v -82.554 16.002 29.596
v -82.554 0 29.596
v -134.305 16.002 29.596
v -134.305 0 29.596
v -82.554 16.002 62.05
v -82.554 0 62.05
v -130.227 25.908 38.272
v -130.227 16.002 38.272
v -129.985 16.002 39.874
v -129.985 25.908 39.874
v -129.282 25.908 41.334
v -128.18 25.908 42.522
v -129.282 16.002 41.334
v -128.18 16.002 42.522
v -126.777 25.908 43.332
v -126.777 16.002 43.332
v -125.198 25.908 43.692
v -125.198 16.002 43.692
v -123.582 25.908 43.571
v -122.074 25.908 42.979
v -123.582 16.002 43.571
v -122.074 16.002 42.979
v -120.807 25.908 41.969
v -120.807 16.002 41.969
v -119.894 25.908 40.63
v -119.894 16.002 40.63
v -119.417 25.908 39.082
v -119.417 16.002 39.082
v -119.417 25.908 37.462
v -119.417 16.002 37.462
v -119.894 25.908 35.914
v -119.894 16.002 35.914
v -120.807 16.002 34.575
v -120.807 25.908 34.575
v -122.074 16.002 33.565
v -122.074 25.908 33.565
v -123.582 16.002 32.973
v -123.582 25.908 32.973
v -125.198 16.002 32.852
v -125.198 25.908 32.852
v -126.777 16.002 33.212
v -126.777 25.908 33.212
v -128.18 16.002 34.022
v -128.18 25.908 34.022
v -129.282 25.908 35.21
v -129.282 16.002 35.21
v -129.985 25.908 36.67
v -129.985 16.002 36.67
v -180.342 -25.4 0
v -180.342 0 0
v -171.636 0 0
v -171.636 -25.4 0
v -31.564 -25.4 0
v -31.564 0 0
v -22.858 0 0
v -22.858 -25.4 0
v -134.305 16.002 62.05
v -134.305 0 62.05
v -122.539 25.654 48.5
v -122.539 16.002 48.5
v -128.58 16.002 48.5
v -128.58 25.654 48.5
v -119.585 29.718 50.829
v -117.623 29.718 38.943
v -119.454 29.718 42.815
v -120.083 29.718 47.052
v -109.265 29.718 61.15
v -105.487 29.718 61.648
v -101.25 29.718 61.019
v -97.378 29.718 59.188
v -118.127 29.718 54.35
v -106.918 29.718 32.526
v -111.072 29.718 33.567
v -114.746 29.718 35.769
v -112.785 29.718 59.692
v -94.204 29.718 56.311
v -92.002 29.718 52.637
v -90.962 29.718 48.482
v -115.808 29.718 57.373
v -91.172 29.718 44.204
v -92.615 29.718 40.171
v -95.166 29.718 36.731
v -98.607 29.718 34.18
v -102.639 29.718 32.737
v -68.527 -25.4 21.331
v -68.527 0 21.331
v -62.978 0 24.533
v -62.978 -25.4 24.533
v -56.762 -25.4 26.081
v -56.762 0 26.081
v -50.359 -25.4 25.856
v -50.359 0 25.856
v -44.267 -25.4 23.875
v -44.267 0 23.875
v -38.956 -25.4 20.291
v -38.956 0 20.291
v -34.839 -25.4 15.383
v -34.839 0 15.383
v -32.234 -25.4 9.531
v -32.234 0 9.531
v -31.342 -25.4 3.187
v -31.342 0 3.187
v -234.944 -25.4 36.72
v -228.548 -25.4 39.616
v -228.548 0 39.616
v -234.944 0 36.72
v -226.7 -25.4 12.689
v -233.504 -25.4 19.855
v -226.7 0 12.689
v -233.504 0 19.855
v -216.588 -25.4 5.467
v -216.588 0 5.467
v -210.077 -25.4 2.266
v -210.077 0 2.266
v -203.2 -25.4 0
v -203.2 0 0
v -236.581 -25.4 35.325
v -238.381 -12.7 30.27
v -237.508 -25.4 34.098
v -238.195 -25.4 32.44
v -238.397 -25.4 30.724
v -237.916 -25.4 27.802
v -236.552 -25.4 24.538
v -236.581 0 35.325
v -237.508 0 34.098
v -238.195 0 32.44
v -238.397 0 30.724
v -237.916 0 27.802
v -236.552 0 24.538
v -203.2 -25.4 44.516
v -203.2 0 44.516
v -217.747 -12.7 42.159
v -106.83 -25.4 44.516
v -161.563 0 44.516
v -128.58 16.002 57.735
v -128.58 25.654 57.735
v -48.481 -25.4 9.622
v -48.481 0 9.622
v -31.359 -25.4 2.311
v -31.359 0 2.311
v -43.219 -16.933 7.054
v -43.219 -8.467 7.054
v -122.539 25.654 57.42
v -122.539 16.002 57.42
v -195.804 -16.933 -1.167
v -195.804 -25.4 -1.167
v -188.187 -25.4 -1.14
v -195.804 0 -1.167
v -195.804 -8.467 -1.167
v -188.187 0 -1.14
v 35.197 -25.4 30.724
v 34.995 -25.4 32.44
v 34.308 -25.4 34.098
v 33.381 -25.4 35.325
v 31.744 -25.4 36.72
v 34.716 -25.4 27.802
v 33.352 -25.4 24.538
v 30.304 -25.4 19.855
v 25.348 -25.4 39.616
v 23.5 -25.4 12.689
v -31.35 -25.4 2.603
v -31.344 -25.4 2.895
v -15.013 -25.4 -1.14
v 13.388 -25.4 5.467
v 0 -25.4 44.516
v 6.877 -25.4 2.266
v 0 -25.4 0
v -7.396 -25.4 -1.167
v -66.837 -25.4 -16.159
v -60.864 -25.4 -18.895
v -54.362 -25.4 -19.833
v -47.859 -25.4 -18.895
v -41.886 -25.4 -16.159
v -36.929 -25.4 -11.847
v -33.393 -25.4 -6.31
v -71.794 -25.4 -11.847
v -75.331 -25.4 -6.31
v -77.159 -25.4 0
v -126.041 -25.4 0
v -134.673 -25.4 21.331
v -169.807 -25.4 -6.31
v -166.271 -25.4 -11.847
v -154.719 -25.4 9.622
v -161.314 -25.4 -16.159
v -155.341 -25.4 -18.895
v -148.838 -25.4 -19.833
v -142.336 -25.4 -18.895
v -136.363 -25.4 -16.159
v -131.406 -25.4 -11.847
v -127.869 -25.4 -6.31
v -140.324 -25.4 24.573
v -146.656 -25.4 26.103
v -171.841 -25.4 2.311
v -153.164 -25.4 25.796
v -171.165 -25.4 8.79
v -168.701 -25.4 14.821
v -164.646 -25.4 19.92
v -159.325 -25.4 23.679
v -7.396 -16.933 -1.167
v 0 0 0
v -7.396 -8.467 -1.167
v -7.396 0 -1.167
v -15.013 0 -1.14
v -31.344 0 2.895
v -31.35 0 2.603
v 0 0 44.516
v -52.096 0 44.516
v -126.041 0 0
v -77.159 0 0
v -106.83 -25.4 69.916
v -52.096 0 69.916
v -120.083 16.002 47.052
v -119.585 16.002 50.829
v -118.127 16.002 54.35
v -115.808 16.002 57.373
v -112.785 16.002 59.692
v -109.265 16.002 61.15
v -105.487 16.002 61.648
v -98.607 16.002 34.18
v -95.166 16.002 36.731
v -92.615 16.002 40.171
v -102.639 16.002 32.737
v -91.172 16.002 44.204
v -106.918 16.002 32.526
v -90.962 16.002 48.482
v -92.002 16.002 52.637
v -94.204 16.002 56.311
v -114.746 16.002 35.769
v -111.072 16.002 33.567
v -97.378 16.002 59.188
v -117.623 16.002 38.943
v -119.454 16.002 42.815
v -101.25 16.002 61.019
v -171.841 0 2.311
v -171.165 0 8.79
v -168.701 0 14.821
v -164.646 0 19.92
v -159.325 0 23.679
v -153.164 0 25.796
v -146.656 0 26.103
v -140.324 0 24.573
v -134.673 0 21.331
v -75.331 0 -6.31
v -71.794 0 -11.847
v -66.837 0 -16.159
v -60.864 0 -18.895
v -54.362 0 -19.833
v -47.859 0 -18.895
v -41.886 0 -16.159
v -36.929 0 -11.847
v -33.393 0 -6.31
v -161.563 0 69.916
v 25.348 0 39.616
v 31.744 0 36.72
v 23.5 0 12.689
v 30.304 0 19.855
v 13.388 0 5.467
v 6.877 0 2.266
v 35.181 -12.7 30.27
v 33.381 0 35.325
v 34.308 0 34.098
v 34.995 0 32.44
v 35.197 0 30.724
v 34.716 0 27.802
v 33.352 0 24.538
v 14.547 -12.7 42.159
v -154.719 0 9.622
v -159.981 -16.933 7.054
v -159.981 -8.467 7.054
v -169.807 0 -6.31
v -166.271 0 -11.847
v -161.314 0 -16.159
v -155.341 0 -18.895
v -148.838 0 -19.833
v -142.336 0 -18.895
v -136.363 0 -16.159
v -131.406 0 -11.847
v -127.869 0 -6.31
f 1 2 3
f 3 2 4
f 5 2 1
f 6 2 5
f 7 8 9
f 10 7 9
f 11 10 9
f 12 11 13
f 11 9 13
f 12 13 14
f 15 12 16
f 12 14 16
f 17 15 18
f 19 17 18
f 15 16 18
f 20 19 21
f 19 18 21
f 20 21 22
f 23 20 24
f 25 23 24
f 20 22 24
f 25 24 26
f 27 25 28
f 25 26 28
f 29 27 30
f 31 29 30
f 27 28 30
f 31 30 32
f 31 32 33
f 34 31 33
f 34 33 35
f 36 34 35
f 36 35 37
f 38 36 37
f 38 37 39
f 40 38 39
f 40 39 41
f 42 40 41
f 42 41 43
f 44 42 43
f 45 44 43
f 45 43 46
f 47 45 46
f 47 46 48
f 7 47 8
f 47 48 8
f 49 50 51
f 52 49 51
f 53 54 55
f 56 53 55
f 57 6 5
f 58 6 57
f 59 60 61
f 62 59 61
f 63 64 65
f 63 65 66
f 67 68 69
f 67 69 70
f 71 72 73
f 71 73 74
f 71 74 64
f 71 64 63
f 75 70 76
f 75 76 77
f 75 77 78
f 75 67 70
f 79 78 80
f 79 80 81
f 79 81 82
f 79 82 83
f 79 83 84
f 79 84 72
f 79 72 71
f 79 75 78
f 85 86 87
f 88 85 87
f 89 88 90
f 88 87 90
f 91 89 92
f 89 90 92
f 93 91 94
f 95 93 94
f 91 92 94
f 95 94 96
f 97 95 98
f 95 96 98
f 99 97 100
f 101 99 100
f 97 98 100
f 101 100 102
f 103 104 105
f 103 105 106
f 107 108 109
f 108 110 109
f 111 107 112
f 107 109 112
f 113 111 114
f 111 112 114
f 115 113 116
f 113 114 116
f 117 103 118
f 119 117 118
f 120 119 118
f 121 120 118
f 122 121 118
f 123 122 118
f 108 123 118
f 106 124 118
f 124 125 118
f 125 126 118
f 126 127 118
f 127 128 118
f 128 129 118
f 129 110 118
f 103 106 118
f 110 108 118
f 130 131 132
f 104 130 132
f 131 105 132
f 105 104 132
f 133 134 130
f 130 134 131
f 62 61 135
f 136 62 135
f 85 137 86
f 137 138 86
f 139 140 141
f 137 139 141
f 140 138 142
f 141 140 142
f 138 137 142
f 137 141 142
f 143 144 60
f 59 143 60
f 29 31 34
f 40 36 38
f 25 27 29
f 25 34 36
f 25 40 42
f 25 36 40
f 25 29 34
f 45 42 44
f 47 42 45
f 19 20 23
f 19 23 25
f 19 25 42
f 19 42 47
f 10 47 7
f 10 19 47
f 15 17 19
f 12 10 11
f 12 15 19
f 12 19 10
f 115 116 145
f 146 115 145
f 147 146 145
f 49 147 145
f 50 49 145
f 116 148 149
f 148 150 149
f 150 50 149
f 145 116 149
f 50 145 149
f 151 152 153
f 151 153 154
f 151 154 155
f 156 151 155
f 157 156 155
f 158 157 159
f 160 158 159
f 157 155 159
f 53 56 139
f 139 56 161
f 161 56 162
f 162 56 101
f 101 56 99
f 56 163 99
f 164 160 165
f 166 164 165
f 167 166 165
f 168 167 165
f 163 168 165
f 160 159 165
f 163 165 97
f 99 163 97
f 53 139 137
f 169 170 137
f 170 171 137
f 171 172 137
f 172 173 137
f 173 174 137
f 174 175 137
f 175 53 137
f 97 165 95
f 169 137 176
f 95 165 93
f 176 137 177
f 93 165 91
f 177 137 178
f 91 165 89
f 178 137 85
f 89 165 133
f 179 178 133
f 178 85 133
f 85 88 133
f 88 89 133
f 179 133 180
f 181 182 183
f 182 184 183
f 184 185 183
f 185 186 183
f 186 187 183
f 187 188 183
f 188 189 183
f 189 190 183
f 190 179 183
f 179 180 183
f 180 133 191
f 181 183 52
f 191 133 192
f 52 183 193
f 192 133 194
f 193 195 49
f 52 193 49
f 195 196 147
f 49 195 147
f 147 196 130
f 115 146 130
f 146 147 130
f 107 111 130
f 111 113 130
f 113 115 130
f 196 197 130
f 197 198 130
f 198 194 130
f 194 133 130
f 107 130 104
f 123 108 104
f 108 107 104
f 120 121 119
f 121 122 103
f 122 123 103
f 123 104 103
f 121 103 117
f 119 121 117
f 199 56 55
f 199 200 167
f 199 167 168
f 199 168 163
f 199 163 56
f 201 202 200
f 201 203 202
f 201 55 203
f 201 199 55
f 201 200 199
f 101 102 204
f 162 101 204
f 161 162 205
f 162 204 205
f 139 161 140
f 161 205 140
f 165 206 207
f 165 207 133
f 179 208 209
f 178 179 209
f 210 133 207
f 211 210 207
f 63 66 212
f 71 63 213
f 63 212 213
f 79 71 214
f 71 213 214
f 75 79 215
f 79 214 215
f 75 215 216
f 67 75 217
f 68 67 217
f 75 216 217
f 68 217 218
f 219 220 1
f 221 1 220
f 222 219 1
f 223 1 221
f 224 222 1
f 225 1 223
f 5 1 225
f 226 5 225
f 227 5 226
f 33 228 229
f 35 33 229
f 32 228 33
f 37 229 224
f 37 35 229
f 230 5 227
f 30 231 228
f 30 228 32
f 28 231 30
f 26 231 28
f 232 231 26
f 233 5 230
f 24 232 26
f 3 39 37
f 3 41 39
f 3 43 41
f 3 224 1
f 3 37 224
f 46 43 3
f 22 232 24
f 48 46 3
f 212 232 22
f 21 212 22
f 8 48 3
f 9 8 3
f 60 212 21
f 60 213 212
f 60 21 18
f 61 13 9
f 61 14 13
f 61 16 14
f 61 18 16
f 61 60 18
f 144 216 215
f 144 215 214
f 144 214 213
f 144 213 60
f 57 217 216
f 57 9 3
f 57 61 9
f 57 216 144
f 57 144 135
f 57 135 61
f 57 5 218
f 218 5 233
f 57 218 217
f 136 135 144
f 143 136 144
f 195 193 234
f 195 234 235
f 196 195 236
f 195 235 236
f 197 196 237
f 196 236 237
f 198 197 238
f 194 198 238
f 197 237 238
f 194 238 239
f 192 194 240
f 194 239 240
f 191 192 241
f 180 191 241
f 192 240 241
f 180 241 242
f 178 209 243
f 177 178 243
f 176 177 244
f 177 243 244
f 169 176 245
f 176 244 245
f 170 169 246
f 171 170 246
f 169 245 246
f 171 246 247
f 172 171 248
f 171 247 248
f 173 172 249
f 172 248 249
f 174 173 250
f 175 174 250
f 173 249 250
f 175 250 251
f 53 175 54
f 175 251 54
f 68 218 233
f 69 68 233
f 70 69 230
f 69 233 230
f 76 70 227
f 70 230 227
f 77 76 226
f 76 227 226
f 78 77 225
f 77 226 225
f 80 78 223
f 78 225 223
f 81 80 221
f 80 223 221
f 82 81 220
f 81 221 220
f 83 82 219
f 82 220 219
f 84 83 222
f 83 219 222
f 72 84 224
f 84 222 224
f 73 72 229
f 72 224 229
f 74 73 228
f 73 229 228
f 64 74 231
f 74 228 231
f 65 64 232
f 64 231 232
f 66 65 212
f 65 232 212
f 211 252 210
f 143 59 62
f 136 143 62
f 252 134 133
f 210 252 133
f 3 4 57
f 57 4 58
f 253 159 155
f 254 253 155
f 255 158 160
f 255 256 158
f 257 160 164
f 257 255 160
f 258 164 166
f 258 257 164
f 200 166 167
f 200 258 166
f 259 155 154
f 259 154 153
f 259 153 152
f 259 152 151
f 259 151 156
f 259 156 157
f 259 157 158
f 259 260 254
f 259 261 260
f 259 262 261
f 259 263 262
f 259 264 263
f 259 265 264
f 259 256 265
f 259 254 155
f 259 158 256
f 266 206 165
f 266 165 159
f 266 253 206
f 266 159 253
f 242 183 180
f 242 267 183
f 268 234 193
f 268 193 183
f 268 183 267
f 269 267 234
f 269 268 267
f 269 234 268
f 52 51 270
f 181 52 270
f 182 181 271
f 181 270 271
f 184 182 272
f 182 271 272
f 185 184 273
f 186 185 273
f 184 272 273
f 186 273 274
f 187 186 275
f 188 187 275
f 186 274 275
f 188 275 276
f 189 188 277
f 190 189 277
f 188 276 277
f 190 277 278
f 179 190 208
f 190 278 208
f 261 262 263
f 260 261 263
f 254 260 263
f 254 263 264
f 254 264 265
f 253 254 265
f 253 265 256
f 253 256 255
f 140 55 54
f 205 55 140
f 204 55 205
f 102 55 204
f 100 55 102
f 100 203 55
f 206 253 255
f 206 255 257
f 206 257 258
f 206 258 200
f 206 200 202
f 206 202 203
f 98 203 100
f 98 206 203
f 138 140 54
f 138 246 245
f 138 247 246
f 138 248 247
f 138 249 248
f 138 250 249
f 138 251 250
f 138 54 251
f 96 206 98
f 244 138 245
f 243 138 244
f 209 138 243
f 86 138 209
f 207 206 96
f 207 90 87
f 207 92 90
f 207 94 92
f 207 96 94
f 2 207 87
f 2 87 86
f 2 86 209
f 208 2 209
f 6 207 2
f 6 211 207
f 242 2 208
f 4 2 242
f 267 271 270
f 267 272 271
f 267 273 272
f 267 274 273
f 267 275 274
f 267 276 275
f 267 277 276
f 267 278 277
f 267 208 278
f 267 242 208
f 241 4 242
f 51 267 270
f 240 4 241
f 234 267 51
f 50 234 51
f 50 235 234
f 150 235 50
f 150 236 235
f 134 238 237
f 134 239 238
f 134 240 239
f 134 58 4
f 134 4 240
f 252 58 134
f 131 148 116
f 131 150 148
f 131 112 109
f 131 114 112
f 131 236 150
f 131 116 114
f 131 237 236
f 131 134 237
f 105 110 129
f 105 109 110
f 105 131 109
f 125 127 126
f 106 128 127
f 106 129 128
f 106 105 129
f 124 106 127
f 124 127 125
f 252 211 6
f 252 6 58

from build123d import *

# Parameters (mm, degrees)
F1_DEPTH  = 25.4
F3_DEPTH  = 25.4
F5_DEPTH  = 29.718
F6_W      = 51.7507717013
F6_H      = 32.4542075396
F7_DEPTH  = 16.002
F9_DEPTH  = 9.652
F8_R      = 5.4354243812
F10_DEPTH = 9.906


with BuildPart() as f1:
    # F0 (on Front) → F1 (new body)
    with BuildSketch(Plane.XZ):
        with BuildLine():
            add(Edge.make_bspline(
                [(0, 0), (-7.2897283, -1.7897330566), (-14.8951404218, -1.670387598), (-22.8579116206, 0)],
                knots=[0.5519320833, 0.5519320833, 0.5519320833, 0.5519320833, 0.6673599665, 0.6673599665, 0.6673599665, 0.6673599665], degree=3))
            Line((0, 0), (-22.8579116206, 0))
        make_face()
        with BuildLine():
            Line((-22.8579116206, 0), (0, 0))
            Line((0, 0), (0, 44.5155379022))
            Line((0, 44.5155379022), (-101.6, 44.5155379022))
            add(Edge.make_bspline(
                [(-68.5272835275, 21.3313974768), (-78.9925734165, 28.0747606793), (-89.9973463161, 35.9700412347), (-101.6, 44.5155379022)],
                knots=[0.8708334463, 0.8708334463, 0.8708334463, 0.8708334463, 1, 1, 1, 1], degree=3))
            ThreePointArc((-68.5272835275, 21.3313974768), (-44.2668342264, 23.8746485463), (-31.3421689342, 3.1867159919))
            ThreePointArc((-31.3421689342, 3.1867159919), (-31.3463366195, 2.7486996352), (-31.3588381664, 2.3108418847))
            add(Edge.make_bspline(
                [(-22.8579116206, 0), (-25.647110234, 0.5851031828), (-28.4801553771, 1.3605130332), (-31.3588381664, 2.3108418847)],
                knots=[0.6673599665, 0.6673599665, 0.6673599665, 0.6673599665, 0.7077920326, 0.7077920326, 0.7077920326, 0.7077920326], degree=3))
        make_face()
        with BuildLine():
            Line((0, 44.5155379022), (0, 0))
            add(Edge.make_bspline(
                [(0, 44.5155379022), (23.3214331824, 41.0351589113), (49.3703629345, 35.9724451619), (18.3038264824, 4.4938524413), (0, 0)],
                knots=[0, 0, 0, 0, 0.2621034562, 0.5519320833, 0.5519320833, 0.5519320833, 0.5519320833], degree=3))
        make_face()
        with BuildLine():
            Line((-31.5638137301, 0), (-22.8579116206, 0))
            add(Edge.make_bspline(
                [(-22.8579116206, 0), (-25.647110234, 0.5851031828), (-28.4801553771, 1.3605130332), (-31.3588381664, 2.3108418847)],
                knots=[0.6673599665, 0.6673599665, 0.6673599665, 0.6673599665, 0.7077920326, 0.7077920326, 0.7077920326, 0.7077920326], degree=3))
            ThreePointArc((-31.3588381664, 2.3108418847), (-31.4321964371, 1.1528371057), (-31.5638137301, 0))
        make_face()
        with BuildLine():
            ThreePointArc((-77.1594360048, 0), (-54.3616248675, -19.8327399414), (-31.5638137301, 0))
            Line((-31.5638137301, 0), (-77.1594360048, 0))
        make_face()
        with BuildLine():
            Line((-77.1594360048, 0), (-31.5638137301, 0))
            ThreePointArc((-31.5638137301, 0), (-31.4321964371, 1.1528371057), (-31.3588381664, 2.3108418847))
            add(Edge.make_bspline(
                [(-31.3588381664, 2.3108418847), (-42.967062935, 6.1430219892), (-55.3173959076, 12.819538653), (-68.5272835275, 21.3313974768)],
                knots=[0.7077920326, 0.7077920326, 0.7077920326, 0.7077920326, 0.8708334463, 0.8708334463, 0.8708334463, 0.8708334463], degree=3))
            ThreePointArc((-68.5272835275, 21.3313974768), (-75.7001265591, 11.8217433237), (-77.1594360048, 0))
        make_face()
        with BuildLine():
            add(Edge.make_bspline(
                [(-68.5272835275, 21.3313974768), (-78.9925734165, 28.0747606793), (-89.9973463161, 35.9700412347), (-101.6, 44.5155379022)],
                knots=[0.8708334463, 0.8708334463, 0.8708334463, 0.8708334463, 1, 1, 1, 1], degree=3))
            Line((-101.6, 44.5155379022), (-101.6, 0))
            Line((-101.6, 0), (-77.1594360048, 0))
            ThreePointArc((-77.1594360048, 0), (-75.7001265591, 11.8217433237), (-68.5272835275, 21.3313974768))
        make_face()
        with BuildLine():
            Line((-101.6, 0), (-101.6, 44.5155379022))
            add(Edge.make_bspline(
                [(-134.6727164725, 21.3313974768), (-124.2074265835, 28.0747606793), (-113.2026536839, 35.9700412347), (-101.6, 44.5155379022)],
                knots=[0.8708334463, 0.8708334463, 0.8708334463, 0.8708334463, 1, 1, 1, 1], degree=3))
            ThreePointArc((-134.6727164725, 21.3313974768), (-128.1504425781, 13.2815066329), (-125.8189191992, 3.1867159919))
            ThreePointArc((-125.8189191992, 3.1867159919), (-125.8743972507, 1.5895086456), (-126.0405639952, 0))
            Line((-126.0405639952, 0), (-101.6, 0))
        make_face()
        with BuildLine():
            add(Edge.make_bspline(
                [(-134.6727164725, 21.3313974768), (-124.2074265835, 28.0747606793), (-113.2026536839, 35.9700412347), (-101.6, 44.5155379022)],
                knots=[0.8708334463, 0.8708334463, 0.8708334463, 0.8708334463, 1, 1, 1, 1], degree=3))
            Line((-101.6, 44.5155379022), (-203.2, 44.5155379022))
            add(Edge.make_bspline(
                [(-203.2, 44.5155379022), (-226.5214331824, 41.0351589113), (-252.5703629345, 35.9724451619), (-221.5038264824, 4.4938524413), (-203.2, 0)],
                knots=[0, 0, 0, 0, 0.2621034562, 0.5519320833, 0.5519320833, 0.5519320833, 0.5519320833], degree=3))
            Line((-203.2, 0), (-180.3420883794, 0))
            add(Edge.make_bspline(
                [(-180.3420883794, 0), (-177.552889766, 0.5851031828), (-174.7198446229, 1.3605130332), (-171.8411618336, 2.3108418847)],
                knots=[0.6673599665, 0.6673599665, 0.6673599665, 0.6673599665, 0.7077920326, 0.7077920326, 0.7077920326, 0.7077920326], degree=3))
            ThreePointArc((-171.8411618336, 2.3108418847), (-159.3249900183, 23.6788183658), (-134.6727164725, 21.3313974768))
        make_face()
        with BuildLine():
            ThreePointArc((-125.8189191992, 3.1867159919), (-128.1504425781, 13.2815066329), (-134.6727164725, 21.3313974768))
            add(Edge.make_bspline(
                [(-171.8411618336, 2.3108418847), (-160.232937065, 6.1430219892), (-147.8826040924, 12.819538653), (-134.6727164725, 21.3313974768)],
                knots=[0.7077920326, 0.7077920326, 0.7077920326, 0.7077920326, 0.8708334463, 0.8708334463, 0.8708334463, 0.8708334463], degree=3))
            ThreePointArc((-171.8411618336, 2.3108418847), (-171.7678035629, 1.1528371057), (-171.6361862699, 0))
            Line((-171.6361862699, 0), (-126.0405639952, 0))
            ThreePointArc((-126.0405639952, 0), (-125.8743972507, 1.5895086456), (-125.8189191992, 3.1867159919))
        make_face()
        with BuildLine():
            ThreePointArc((-171.6361862699, 0), (-148.8383751325, -19.8327399414), (-126.0405639952, 0))
            Line((-126.0405639952, 0), (-171.6361862699, 0))
        make_face()
        with BuildLine():
            ThreePointArc((-171.6361862699, 0), (-171.7678035629, 1.1528371057), (-171.8411618336, 2.3108418847))
            add(Edge.make_bspline(
                [(-180.3420883794, 0), (-177.552889766, 0.5851031828), (-174.7198446229, 1.3605130332), (-171.8411618336, 2.3108418847)],
                knots=[0.6673599665, 0.6673599665, 0.6673599665, 0.6673599665, 0.7077920326, 0.7077920326, 0.7077920326, 0.7077920326], degree=3))
            Line((-180.3420883794, 0), (-171.6361862699, 0))
        make_face()
        with BuildLine():
            Line((-180.3420883794, 0), (-203.2, 0))
            add(Edge.make_bspline(
                [(-203.2, 0), (-195.9102717, -1.7897330566), (-188.3048595782, -1.670387598), (-180.3420883794, 0)],
                knots=[0.5519320833, 0.5519320833, 0.5519320833, 0.5519320833, 0.6673599665, 0.6673599665, 0.6673599665, 0.6673599665], degree=3))
        make_face()
    extrude(amount=F1_DEPTH)

    # F2 (on face) → F3 (join)
    with BuildSketch(Plane.XY.offset(44.5155379022)):
        Polygon((-106.8298220634, -25.4), (-106.8298220634, 0), (-161.563180387, 0), align=None)
        Polygon((-52.0964637399, 0), (-106.8298220634, 0), (-106.8298220634, -25.4), align=None)
    extrude(amount=F3_DEPTH)

    # F4 (on face) → F5 (join)
    with BuildSketch(Plane(origin=(0, 0, 0), x_dir=(-1, 0, 0), z_dir=(0, 1, 0))):
        with BuildLine():
            ThreePointArc((120.0825944543, 47.0518544316), (115.8076187762, 57.3725586924), (105.4869145155, 61.6475343704))
            ThreePointArc((105.4869145155, 61.6475343704), (95.1662102547, 36.7311501709), (120.0825944543, 47.0518544316))
        make_face()
    extrude(amount=F5_DEPTH)

    # F6 (on face) → F7 (join)
    with BuildSketch(Plane(origin=(0, 0, 0), x_dir=(-1, 0, 0), z_dir=(0, 1, 0))):
        with Locations((108.4294952452, 45.8226948977)):
            Rectangle(F6_W, F6_H)
    extrude(amount=F7_DEPTH)

    # F8 (on face) → F9 (join)
    with BuildSketch(Plane(origin=(0, 16.002, 0), x_dir=(-1, 0, 0), z_dir=(0, 1, 0))):
        Polygon((128.5798549652, 57.735029608), (122.539177537, 57.4203245342), (122.539177537, 48.4996959567), (128.5798549652, 48.4996959567), align=None)
    extrude(amount=F9_DEPTH)

    # F8 (on face) → F10 (join)
    with BuildSketch(Plane(origin=(0, 16.002, 0), x_dir=(-1, 0, 0), z_dir=(0, 1, 0))):
        with Locations((124.7914806008, 38.2719635963)):
            Circle(F8_R)
    extrude(amount=F10_DEPTH)


solid = f1.part
